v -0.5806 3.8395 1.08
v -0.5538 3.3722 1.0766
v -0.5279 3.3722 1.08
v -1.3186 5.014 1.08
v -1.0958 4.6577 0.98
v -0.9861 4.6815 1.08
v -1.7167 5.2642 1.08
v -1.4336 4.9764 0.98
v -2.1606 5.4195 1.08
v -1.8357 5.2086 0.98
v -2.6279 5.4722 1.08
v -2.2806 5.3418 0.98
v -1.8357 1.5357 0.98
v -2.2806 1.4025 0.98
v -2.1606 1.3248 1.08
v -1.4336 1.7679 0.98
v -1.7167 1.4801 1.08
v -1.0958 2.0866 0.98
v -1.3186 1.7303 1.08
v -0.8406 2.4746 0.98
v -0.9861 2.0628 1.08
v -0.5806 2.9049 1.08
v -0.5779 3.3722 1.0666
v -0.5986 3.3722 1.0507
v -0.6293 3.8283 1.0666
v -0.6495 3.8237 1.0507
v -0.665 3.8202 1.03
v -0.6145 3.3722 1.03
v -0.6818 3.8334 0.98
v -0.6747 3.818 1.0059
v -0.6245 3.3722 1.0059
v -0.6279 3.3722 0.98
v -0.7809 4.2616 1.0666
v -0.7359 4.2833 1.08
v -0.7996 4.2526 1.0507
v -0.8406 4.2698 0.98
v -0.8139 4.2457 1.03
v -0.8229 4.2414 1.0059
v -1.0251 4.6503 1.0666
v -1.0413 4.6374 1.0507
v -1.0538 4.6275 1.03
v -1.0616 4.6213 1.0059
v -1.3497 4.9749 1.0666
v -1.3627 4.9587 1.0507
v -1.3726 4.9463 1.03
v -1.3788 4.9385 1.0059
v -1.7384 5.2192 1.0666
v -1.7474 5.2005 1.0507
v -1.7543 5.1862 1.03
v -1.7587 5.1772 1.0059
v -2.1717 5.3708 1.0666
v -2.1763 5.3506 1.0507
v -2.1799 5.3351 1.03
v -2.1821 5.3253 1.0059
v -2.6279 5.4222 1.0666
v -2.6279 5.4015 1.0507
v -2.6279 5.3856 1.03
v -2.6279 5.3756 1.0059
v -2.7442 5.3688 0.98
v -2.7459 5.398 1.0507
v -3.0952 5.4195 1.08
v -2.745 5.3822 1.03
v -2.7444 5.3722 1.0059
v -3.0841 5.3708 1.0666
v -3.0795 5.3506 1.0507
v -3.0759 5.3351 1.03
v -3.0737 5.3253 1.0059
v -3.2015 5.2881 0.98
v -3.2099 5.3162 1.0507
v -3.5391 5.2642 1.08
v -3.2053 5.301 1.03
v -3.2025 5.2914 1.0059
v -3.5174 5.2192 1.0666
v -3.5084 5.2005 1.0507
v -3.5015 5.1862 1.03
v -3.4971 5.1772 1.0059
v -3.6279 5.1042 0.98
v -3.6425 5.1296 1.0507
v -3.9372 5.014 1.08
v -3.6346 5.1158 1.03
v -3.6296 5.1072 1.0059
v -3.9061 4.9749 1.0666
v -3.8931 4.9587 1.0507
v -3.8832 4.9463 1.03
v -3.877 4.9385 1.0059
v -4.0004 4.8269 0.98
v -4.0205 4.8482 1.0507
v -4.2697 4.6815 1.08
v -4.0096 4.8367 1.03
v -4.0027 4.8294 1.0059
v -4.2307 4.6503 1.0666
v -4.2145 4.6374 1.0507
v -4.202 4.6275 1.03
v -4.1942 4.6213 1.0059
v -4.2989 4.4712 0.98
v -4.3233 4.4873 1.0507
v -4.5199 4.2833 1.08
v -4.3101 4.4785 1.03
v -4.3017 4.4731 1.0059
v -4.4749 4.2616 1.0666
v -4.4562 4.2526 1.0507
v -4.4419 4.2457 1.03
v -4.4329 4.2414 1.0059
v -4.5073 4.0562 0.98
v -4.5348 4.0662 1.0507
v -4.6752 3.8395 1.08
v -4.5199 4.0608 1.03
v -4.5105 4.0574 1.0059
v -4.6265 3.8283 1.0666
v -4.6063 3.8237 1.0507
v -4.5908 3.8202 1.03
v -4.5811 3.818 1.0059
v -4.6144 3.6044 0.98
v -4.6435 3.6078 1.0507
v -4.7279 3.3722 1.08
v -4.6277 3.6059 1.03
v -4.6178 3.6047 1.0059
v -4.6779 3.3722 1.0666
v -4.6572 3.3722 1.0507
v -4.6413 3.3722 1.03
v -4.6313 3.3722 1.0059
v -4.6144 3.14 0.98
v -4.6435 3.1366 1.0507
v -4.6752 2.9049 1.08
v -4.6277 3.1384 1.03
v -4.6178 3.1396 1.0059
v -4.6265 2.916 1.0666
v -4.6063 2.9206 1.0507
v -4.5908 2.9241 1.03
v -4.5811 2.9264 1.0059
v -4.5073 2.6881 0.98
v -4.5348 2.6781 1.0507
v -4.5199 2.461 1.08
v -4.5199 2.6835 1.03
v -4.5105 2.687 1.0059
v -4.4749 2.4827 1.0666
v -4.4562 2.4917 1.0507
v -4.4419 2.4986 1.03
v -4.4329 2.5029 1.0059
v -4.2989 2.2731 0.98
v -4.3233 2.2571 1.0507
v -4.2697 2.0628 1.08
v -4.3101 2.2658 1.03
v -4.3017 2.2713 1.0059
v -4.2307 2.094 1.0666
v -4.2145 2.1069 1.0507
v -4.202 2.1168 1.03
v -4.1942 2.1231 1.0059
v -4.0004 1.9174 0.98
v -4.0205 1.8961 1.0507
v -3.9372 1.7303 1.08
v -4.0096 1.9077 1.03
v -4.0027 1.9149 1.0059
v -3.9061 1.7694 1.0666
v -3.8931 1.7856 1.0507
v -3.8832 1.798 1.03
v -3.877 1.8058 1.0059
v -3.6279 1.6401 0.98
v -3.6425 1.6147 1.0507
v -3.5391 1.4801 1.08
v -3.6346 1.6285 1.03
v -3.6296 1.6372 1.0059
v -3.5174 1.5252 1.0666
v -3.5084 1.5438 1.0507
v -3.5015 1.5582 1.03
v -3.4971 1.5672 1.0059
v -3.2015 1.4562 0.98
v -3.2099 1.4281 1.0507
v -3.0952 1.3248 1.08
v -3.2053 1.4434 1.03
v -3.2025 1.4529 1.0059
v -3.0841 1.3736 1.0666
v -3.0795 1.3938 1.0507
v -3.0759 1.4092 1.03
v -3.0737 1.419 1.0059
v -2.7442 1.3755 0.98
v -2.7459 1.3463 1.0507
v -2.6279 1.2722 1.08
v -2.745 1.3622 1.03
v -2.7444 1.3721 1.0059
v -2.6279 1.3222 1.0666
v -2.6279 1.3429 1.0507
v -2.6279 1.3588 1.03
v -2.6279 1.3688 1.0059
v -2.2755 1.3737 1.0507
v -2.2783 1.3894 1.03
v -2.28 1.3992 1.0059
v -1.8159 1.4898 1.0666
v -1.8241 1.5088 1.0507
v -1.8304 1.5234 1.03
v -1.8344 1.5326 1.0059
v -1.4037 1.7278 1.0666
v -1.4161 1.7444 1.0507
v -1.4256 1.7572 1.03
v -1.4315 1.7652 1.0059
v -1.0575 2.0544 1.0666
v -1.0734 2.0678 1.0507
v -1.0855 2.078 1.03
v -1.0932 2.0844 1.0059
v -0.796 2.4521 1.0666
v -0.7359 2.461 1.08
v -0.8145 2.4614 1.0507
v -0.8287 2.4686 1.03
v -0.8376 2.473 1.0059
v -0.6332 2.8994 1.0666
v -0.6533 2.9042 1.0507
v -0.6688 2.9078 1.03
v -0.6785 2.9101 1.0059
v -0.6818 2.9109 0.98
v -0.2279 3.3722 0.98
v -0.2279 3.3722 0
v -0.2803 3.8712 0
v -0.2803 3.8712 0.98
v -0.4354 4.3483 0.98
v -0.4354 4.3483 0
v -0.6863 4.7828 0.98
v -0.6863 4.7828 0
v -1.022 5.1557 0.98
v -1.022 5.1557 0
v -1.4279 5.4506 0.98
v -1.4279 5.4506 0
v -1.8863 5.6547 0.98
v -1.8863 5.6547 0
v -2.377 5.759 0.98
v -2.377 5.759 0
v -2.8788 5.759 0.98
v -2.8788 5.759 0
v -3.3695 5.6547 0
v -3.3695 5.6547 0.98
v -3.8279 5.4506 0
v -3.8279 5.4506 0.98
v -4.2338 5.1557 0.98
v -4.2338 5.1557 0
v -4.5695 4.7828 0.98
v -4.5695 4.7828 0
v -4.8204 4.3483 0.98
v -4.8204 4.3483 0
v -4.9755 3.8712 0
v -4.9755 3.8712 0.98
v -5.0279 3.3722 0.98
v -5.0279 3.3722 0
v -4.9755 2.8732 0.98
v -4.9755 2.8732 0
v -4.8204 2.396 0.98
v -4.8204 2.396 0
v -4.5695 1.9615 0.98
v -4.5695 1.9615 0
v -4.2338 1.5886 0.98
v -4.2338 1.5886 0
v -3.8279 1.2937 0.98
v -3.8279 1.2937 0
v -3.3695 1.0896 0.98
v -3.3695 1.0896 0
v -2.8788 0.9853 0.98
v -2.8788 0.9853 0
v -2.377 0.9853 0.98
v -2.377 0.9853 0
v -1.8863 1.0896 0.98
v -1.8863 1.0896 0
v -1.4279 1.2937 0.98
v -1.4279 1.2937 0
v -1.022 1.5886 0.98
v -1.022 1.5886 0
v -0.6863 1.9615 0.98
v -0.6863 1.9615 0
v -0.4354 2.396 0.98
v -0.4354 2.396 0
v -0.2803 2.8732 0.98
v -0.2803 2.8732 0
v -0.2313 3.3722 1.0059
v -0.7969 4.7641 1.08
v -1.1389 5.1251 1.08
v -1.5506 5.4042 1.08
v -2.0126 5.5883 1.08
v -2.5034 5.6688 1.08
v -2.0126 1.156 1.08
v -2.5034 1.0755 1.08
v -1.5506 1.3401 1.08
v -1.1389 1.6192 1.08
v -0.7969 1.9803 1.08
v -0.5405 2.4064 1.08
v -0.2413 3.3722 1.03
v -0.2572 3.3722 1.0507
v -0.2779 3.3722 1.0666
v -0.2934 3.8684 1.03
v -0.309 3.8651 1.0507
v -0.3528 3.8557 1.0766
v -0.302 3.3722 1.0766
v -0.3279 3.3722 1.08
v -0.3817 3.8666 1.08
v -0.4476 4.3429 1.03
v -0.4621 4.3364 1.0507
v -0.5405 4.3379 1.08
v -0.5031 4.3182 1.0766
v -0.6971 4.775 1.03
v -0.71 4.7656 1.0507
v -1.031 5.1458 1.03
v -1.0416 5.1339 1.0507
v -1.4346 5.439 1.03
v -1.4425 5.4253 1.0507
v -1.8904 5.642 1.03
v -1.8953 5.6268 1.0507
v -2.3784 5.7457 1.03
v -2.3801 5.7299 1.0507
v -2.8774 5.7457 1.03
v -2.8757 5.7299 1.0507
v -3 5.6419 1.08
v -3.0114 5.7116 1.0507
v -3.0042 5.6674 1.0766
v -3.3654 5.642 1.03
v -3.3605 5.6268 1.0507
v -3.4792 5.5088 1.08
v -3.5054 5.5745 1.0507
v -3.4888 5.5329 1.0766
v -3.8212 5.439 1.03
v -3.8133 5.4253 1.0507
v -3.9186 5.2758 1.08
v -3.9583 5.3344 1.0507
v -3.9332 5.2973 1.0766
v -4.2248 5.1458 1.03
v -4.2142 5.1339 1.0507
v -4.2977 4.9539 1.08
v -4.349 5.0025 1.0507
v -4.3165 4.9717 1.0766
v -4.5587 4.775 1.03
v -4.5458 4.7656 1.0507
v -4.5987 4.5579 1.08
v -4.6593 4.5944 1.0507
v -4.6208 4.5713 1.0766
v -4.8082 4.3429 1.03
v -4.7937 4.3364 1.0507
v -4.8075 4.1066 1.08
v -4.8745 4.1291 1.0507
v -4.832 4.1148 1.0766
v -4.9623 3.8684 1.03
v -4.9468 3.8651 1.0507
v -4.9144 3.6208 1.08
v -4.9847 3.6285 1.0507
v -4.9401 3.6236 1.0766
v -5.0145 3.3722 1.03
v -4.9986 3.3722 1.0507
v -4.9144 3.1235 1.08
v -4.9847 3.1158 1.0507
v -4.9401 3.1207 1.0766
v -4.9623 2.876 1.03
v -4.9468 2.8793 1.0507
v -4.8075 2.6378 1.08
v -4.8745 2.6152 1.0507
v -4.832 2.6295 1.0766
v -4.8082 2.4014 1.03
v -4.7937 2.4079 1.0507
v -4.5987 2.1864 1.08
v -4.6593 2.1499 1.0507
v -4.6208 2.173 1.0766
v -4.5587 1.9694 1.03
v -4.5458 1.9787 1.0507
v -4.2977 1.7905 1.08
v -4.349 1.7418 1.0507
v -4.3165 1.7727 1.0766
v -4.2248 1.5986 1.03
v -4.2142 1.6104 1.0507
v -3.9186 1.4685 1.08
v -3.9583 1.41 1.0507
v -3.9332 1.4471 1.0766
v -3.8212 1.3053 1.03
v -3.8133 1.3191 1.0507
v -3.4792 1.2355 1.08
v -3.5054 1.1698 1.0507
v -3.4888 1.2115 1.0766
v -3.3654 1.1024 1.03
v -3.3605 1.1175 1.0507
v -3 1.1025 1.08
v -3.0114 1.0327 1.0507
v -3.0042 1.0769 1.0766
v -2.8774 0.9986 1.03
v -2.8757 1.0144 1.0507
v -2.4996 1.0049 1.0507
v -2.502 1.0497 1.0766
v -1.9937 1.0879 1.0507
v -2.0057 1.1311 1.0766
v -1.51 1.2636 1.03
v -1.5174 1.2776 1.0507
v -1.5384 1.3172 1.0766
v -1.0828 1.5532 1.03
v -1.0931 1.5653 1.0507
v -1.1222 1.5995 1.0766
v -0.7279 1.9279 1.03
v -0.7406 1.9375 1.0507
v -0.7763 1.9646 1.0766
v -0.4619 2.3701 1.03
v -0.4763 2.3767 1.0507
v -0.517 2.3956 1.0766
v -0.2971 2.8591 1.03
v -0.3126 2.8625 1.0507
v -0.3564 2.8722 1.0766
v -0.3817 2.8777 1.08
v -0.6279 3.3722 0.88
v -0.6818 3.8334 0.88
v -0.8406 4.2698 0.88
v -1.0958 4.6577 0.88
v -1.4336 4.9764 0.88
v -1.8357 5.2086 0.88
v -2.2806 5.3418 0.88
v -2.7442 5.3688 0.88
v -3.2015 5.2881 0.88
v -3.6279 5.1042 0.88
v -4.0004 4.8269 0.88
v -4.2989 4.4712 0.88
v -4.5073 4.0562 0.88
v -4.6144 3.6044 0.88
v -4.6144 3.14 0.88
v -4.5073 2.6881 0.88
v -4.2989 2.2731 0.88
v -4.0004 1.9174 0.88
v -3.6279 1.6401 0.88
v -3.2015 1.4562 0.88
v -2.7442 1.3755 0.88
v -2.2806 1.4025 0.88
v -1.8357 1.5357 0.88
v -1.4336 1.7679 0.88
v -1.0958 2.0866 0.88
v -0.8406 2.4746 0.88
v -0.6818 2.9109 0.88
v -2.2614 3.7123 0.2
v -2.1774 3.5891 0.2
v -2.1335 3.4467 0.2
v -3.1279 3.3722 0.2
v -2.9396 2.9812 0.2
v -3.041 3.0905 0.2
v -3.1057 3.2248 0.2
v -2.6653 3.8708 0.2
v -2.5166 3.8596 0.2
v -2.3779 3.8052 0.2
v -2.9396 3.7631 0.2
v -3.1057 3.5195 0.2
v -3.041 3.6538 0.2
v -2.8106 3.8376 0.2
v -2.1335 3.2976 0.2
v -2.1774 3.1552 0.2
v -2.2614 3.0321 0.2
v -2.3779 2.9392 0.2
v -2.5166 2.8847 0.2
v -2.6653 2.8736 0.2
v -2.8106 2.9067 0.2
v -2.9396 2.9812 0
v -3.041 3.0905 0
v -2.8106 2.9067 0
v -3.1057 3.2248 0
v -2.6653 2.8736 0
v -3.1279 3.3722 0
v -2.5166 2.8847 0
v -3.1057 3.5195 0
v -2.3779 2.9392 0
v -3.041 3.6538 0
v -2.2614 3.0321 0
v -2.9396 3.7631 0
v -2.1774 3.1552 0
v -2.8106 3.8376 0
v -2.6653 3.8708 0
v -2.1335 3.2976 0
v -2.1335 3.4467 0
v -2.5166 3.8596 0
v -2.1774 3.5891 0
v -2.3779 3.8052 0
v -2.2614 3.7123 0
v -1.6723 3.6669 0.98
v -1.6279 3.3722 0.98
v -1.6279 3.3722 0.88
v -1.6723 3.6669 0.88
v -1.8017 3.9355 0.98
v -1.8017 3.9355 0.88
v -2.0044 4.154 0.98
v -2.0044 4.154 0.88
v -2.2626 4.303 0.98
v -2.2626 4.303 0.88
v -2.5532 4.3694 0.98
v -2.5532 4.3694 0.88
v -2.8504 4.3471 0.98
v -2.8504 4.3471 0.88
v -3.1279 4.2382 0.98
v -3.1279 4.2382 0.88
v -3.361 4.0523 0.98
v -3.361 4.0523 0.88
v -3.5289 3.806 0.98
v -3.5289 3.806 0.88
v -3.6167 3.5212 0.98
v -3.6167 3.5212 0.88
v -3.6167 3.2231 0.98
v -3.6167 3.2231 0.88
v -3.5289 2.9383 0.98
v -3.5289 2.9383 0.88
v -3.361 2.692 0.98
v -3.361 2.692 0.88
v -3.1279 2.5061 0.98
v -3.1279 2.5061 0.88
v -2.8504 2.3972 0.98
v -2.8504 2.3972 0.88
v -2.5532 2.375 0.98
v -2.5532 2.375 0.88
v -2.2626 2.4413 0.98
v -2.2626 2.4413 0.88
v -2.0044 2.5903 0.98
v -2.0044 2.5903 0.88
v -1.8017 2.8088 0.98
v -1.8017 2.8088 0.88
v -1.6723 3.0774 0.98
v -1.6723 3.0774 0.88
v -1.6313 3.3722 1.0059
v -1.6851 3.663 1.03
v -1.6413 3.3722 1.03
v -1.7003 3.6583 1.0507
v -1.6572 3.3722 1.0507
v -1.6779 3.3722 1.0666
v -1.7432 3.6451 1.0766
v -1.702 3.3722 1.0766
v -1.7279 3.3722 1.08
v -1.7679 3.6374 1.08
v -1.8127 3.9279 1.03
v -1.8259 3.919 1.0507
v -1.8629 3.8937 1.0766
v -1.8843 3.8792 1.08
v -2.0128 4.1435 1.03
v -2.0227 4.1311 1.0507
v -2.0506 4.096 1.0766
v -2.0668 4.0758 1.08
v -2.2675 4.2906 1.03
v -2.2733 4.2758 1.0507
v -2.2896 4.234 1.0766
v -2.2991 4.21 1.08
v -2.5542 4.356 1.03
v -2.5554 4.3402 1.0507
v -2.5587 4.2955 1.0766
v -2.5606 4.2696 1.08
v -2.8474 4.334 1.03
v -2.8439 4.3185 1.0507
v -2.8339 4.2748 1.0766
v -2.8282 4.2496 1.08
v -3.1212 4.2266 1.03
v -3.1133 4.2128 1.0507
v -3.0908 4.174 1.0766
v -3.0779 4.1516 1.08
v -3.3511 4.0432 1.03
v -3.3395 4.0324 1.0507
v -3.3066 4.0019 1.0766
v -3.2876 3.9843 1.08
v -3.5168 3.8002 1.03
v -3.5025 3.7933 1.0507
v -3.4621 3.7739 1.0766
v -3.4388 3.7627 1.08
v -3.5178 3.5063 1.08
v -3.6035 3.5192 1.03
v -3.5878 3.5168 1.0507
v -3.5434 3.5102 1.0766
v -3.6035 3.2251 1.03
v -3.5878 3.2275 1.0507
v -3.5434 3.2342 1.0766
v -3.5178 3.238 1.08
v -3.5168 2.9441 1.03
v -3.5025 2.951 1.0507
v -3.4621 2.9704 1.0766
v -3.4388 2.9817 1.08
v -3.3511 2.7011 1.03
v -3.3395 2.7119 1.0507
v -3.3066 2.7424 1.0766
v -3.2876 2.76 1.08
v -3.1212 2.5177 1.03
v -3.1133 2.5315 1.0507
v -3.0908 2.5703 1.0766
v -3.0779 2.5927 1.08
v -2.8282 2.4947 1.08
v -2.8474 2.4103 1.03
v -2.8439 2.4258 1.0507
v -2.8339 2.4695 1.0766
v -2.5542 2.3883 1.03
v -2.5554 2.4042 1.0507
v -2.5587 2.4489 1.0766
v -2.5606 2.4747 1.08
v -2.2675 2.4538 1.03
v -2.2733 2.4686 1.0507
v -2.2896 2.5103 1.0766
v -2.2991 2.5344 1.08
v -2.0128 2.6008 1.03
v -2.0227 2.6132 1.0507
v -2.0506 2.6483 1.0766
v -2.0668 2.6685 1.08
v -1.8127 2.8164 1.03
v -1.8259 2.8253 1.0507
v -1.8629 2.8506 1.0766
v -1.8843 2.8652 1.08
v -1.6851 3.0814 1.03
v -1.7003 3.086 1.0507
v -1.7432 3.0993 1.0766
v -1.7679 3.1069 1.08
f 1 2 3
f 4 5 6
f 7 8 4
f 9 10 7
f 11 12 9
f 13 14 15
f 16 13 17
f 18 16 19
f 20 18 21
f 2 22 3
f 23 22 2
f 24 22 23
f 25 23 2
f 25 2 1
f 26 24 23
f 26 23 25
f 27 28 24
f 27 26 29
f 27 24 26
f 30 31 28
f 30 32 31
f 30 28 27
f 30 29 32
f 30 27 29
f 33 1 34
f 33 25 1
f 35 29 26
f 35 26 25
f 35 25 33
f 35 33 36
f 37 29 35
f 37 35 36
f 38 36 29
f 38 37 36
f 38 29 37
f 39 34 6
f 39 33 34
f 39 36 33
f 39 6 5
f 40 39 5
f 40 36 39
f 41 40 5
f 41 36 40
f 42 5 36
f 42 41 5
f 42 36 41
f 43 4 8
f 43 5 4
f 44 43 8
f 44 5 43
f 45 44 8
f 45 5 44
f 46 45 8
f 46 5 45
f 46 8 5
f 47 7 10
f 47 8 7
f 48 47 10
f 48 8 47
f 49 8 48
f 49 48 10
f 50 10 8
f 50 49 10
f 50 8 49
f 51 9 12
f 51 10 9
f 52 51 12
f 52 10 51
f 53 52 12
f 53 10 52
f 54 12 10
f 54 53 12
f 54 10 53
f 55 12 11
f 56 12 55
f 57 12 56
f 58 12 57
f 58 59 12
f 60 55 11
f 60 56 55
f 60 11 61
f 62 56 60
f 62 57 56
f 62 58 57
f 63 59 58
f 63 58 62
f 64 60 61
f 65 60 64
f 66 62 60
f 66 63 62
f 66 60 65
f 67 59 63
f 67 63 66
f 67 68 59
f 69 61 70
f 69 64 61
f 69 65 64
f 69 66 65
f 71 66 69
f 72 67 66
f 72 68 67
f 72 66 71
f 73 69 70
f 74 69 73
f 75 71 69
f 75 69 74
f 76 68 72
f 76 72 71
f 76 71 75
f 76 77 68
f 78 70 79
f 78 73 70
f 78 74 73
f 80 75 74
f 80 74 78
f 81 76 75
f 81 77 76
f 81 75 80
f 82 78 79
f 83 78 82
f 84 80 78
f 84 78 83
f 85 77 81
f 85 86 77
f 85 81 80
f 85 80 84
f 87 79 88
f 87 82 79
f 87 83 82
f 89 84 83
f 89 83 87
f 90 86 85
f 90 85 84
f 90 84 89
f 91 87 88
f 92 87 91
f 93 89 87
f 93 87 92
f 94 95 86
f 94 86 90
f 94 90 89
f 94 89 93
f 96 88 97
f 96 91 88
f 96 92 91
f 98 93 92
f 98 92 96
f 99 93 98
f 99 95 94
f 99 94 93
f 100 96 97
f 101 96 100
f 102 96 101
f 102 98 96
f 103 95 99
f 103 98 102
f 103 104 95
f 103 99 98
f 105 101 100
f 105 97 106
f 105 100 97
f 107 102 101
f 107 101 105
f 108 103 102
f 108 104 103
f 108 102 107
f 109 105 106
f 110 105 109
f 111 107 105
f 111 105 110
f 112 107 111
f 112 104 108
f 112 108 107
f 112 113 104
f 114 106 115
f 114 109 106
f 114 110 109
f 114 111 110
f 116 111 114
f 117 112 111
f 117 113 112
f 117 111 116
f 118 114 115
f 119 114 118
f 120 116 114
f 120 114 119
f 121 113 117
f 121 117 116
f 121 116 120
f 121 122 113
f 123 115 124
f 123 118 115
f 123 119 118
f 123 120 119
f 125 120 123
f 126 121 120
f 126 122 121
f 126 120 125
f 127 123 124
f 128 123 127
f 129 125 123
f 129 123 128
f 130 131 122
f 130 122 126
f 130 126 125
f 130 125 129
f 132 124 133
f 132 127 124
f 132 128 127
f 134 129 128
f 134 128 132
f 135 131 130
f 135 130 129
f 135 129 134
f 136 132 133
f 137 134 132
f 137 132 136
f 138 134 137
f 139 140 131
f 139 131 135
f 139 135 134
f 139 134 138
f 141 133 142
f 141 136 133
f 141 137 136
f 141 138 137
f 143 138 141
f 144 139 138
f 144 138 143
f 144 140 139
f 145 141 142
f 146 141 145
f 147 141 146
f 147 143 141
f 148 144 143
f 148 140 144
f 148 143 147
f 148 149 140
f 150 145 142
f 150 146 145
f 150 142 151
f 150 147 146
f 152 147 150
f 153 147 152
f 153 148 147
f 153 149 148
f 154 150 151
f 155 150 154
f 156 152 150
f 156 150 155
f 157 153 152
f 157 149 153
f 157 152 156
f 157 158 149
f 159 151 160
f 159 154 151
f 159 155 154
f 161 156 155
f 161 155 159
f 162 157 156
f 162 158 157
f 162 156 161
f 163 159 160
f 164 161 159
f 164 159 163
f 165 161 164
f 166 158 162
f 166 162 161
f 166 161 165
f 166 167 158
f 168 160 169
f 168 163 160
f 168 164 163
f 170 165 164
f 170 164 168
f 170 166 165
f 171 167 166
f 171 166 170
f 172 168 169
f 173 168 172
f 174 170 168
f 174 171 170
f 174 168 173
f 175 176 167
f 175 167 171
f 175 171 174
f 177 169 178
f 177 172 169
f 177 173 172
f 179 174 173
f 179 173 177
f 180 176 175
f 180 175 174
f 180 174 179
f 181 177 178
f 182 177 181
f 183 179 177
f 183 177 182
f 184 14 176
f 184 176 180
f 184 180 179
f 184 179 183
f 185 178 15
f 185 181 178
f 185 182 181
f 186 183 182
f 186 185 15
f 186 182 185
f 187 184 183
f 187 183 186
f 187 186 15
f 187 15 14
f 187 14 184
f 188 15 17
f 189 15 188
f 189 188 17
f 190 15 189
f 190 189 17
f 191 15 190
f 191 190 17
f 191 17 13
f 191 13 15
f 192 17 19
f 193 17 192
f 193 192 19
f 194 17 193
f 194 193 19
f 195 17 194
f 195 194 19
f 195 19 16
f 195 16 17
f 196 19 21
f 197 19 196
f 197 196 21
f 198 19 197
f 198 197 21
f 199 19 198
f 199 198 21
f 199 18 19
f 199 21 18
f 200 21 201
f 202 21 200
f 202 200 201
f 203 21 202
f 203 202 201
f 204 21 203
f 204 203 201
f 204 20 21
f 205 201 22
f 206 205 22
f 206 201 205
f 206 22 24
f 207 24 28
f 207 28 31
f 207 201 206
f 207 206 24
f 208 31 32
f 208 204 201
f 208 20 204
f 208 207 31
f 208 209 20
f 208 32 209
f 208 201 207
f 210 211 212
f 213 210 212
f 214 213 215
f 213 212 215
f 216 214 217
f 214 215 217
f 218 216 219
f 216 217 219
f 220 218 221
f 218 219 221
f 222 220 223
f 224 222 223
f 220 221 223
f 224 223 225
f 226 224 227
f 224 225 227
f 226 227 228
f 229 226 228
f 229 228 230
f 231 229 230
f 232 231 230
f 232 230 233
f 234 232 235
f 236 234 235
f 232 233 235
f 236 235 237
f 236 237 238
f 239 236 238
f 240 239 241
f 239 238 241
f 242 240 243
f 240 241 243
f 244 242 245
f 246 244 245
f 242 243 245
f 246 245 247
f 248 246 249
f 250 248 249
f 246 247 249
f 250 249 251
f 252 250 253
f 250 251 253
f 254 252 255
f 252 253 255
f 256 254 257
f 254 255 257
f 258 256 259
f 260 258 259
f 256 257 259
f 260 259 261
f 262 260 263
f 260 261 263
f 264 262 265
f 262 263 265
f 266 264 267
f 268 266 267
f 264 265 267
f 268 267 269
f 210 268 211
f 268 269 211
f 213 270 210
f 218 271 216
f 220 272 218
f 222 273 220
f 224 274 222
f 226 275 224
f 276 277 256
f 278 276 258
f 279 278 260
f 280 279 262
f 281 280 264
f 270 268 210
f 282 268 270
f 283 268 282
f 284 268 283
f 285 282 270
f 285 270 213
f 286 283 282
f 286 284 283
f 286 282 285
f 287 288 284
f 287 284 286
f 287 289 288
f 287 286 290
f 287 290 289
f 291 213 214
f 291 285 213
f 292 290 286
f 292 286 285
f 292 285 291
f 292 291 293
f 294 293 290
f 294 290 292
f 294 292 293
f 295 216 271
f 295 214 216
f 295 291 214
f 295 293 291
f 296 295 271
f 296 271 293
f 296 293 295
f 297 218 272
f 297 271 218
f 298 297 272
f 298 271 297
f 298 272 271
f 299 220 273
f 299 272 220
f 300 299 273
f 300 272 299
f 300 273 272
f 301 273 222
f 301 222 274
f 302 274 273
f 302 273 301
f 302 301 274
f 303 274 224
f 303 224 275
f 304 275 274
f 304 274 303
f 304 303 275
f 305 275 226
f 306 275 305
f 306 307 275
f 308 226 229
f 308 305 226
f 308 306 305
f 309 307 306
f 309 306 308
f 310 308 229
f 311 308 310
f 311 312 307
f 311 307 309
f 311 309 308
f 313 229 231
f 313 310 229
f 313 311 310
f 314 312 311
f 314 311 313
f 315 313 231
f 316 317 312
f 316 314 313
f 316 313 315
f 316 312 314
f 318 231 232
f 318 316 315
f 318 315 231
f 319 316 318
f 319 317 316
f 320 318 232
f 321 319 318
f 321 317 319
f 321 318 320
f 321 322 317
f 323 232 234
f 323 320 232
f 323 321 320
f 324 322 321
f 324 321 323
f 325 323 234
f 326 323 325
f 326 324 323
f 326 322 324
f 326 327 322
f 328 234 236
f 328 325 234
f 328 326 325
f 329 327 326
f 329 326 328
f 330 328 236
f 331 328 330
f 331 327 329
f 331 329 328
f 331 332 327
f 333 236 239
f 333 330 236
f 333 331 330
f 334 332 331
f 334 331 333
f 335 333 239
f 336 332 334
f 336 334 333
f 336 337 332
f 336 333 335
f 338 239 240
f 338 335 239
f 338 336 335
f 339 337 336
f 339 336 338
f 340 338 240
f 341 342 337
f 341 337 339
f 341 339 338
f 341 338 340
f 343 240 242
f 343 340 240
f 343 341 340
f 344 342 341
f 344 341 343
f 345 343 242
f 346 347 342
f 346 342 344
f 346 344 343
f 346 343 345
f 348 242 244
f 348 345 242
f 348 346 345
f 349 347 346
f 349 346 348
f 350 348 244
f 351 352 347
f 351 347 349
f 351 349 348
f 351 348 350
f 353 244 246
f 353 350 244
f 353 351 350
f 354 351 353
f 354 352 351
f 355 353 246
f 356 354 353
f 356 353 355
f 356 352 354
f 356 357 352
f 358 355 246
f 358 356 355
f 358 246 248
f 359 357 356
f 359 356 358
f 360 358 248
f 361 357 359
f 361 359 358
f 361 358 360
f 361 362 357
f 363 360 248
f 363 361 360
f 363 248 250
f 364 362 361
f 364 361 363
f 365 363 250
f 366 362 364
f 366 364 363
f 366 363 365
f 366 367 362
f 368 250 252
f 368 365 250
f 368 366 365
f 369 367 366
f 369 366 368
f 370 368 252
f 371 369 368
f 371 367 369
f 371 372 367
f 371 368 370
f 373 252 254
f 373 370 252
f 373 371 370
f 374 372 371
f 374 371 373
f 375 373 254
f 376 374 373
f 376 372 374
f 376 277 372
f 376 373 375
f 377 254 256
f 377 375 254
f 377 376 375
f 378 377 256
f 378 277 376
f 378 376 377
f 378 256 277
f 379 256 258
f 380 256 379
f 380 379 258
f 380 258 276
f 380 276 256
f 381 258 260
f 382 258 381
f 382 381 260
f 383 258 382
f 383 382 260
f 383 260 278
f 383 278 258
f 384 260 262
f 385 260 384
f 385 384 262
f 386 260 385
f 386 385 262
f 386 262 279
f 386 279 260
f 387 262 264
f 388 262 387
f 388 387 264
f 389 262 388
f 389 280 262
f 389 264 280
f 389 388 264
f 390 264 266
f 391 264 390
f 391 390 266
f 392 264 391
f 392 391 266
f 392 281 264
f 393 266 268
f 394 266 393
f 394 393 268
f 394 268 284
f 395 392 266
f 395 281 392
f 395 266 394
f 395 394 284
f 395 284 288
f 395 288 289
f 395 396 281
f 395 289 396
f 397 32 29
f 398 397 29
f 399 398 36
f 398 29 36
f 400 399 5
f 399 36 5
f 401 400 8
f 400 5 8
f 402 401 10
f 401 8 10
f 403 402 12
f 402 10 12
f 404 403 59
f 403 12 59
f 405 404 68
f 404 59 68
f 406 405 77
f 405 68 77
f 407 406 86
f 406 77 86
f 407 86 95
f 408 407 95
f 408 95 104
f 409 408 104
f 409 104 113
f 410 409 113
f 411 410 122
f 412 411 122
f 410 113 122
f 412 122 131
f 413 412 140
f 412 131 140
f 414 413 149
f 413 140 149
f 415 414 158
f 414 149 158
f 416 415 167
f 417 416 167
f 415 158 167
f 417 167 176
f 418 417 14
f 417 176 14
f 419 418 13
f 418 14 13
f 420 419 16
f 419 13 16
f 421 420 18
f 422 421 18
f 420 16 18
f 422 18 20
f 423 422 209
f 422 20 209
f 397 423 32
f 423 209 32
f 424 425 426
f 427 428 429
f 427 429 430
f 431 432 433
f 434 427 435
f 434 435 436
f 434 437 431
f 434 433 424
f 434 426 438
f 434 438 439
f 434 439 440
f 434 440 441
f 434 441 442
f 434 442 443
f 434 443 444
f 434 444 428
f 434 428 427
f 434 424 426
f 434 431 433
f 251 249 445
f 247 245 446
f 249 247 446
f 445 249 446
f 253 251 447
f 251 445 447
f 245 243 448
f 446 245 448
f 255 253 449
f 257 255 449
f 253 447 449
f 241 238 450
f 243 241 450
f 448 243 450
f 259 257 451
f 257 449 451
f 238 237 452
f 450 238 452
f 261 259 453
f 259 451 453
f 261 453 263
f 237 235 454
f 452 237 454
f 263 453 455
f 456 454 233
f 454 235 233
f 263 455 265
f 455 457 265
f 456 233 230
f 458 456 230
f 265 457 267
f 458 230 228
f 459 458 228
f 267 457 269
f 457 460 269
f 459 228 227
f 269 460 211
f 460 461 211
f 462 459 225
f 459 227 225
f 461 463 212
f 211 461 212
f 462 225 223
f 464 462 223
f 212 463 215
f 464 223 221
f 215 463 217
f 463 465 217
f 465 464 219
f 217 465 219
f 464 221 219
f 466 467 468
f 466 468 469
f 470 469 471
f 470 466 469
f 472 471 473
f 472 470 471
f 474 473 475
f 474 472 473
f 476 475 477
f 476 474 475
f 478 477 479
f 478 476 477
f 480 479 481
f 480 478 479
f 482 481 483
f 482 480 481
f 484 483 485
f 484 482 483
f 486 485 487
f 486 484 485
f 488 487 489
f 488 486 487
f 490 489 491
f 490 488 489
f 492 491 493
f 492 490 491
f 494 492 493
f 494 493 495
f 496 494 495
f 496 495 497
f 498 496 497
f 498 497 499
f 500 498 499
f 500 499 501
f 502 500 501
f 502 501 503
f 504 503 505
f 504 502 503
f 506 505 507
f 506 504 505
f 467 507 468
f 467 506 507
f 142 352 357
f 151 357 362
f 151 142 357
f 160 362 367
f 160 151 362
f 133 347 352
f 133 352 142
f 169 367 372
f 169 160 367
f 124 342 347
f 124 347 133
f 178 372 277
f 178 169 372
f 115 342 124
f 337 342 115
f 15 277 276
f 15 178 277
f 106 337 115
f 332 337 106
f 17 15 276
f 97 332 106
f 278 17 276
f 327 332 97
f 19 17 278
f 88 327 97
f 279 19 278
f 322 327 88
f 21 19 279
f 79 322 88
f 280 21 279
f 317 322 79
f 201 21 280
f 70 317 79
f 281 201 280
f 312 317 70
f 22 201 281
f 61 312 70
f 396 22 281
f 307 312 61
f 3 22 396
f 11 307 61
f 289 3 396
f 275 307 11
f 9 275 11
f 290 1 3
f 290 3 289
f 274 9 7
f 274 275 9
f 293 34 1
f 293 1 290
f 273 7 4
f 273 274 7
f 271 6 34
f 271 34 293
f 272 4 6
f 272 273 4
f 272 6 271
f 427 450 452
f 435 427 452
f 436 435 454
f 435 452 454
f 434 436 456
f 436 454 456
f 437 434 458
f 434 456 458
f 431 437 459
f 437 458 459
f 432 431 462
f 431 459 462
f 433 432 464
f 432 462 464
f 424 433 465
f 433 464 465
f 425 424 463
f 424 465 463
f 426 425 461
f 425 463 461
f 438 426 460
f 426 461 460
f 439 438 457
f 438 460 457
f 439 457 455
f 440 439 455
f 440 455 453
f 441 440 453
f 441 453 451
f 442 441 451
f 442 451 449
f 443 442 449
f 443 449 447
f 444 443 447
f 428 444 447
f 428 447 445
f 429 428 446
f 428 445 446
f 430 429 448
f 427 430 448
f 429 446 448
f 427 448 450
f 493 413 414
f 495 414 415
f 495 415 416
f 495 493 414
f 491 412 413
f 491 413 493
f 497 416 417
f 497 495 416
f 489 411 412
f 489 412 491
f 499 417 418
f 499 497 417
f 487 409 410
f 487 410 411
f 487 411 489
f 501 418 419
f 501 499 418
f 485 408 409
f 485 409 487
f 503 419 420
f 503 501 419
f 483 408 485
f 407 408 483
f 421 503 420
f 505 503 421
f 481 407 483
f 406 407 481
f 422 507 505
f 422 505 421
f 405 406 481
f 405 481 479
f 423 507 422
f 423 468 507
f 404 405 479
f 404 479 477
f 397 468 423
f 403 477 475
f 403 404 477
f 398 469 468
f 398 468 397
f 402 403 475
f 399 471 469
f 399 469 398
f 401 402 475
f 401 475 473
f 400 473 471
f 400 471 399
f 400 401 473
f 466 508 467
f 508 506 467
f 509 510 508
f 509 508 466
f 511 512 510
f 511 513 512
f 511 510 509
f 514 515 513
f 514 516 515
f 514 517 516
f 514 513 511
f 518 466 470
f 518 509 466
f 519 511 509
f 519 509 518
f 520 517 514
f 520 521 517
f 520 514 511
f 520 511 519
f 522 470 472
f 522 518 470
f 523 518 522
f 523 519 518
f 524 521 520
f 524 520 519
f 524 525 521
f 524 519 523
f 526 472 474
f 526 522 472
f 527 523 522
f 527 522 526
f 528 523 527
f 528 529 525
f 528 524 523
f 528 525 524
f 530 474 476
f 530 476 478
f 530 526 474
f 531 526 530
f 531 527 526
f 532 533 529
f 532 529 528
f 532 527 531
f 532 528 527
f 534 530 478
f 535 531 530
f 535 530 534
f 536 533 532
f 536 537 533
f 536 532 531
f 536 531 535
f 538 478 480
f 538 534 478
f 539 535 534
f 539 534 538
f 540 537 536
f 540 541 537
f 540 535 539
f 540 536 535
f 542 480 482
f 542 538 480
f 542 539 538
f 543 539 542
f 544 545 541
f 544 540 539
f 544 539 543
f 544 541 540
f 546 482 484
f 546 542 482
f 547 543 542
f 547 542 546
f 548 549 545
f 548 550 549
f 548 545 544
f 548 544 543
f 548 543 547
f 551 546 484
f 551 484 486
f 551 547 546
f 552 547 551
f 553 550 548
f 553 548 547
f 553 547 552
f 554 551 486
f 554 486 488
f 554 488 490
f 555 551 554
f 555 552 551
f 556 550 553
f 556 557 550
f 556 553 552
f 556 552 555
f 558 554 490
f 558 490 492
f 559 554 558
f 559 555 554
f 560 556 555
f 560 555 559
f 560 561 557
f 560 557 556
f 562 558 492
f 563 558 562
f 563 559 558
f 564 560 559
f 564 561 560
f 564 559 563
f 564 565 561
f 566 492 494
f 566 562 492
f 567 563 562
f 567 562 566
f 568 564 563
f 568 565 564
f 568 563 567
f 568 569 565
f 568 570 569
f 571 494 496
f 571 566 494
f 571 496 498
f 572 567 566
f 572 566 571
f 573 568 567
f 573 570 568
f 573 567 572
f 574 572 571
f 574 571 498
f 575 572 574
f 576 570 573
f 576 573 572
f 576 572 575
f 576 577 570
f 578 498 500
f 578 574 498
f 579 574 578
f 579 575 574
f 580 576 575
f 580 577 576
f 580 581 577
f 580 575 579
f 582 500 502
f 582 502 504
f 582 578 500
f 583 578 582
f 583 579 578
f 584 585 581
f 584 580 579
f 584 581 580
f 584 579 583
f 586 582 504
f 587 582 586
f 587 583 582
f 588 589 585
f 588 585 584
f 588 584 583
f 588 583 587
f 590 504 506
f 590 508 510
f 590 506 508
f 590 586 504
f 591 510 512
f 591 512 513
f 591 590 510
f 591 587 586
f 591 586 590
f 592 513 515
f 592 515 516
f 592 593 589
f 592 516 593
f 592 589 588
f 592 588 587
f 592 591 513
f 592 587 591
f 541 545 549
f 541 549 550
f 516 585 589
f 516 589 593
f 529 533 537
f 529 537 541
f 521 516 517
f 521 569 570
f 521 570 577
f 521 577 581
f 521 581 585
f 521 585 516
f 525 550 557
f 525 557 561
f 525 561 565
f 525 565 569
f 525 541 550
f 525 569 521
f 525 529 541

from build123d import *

# Parameters (mm, degrees)
SKETCH1_R           = 2.4
BOSS_EXTRUDE1_DEPTH = 1.08
SKETCH2_R           = 2
SKETCH2_R_2         = 1
CUT_EXTRUDE1_DEPTH  = 0.2
FILLET2_R           = 0.1
SKETCH3_R           = 0.5
CUT_EXTRUDE2_DEPTH  = 0.2


with BuildPart() as part:
    # Sketch1 → Boss-Extrude1 (new body)
    with BuildSketch(Plane.XY):
        with Locations((-2.627899096, 3.372164225)):
            Circle(SKETCH1_R)
    extrude(amount=BOSS_EXTRUDE1_DEPTH)

    # Sketch2 → Cut-Extrude1 (cut)
    with BuildSketch(Plane.XY.offset(1.08)):
        with Locations((-2.627899096, 3.372164225)):
            Circle(SKETCH2_R)
        with Locations((-2.627899096, 3.372164225)):
            Circle(SKETCH2_R_2, mode=Mode.SUBTRACT)
    extrude(amount=-CUT_EXTRUDE1_DEPTH, mode=Mode.SUBTRACT)

    # Fillet2
    fillet2_edges = [part.edges().sort_by_distance(p)[0] for p in [
        (-5.027899096, 3.372164225, 1.08),
        (-4.627899096, 3.372164225, 1.08),
        (-3.627899096, 3.372164225, 1.08),
    ]]
    fillet(fillet2_edges, radius=FILLET2_R)

    # Sketch3 → Cut-Extrude2 (cut)
    with BuildSketch(Plane(origin=(0, 0, 0), x_dir=(-1, 0, 0), z_dir=(0, 0, -1))):
        with Locations((2.627899096, 3.372164225)):
            Circle(SKETCH3_R)
    extrude(amount=-CUT_EXTRUDE2_DEPTH, mode=Mode.SUBTRACT)


solid = part.part
